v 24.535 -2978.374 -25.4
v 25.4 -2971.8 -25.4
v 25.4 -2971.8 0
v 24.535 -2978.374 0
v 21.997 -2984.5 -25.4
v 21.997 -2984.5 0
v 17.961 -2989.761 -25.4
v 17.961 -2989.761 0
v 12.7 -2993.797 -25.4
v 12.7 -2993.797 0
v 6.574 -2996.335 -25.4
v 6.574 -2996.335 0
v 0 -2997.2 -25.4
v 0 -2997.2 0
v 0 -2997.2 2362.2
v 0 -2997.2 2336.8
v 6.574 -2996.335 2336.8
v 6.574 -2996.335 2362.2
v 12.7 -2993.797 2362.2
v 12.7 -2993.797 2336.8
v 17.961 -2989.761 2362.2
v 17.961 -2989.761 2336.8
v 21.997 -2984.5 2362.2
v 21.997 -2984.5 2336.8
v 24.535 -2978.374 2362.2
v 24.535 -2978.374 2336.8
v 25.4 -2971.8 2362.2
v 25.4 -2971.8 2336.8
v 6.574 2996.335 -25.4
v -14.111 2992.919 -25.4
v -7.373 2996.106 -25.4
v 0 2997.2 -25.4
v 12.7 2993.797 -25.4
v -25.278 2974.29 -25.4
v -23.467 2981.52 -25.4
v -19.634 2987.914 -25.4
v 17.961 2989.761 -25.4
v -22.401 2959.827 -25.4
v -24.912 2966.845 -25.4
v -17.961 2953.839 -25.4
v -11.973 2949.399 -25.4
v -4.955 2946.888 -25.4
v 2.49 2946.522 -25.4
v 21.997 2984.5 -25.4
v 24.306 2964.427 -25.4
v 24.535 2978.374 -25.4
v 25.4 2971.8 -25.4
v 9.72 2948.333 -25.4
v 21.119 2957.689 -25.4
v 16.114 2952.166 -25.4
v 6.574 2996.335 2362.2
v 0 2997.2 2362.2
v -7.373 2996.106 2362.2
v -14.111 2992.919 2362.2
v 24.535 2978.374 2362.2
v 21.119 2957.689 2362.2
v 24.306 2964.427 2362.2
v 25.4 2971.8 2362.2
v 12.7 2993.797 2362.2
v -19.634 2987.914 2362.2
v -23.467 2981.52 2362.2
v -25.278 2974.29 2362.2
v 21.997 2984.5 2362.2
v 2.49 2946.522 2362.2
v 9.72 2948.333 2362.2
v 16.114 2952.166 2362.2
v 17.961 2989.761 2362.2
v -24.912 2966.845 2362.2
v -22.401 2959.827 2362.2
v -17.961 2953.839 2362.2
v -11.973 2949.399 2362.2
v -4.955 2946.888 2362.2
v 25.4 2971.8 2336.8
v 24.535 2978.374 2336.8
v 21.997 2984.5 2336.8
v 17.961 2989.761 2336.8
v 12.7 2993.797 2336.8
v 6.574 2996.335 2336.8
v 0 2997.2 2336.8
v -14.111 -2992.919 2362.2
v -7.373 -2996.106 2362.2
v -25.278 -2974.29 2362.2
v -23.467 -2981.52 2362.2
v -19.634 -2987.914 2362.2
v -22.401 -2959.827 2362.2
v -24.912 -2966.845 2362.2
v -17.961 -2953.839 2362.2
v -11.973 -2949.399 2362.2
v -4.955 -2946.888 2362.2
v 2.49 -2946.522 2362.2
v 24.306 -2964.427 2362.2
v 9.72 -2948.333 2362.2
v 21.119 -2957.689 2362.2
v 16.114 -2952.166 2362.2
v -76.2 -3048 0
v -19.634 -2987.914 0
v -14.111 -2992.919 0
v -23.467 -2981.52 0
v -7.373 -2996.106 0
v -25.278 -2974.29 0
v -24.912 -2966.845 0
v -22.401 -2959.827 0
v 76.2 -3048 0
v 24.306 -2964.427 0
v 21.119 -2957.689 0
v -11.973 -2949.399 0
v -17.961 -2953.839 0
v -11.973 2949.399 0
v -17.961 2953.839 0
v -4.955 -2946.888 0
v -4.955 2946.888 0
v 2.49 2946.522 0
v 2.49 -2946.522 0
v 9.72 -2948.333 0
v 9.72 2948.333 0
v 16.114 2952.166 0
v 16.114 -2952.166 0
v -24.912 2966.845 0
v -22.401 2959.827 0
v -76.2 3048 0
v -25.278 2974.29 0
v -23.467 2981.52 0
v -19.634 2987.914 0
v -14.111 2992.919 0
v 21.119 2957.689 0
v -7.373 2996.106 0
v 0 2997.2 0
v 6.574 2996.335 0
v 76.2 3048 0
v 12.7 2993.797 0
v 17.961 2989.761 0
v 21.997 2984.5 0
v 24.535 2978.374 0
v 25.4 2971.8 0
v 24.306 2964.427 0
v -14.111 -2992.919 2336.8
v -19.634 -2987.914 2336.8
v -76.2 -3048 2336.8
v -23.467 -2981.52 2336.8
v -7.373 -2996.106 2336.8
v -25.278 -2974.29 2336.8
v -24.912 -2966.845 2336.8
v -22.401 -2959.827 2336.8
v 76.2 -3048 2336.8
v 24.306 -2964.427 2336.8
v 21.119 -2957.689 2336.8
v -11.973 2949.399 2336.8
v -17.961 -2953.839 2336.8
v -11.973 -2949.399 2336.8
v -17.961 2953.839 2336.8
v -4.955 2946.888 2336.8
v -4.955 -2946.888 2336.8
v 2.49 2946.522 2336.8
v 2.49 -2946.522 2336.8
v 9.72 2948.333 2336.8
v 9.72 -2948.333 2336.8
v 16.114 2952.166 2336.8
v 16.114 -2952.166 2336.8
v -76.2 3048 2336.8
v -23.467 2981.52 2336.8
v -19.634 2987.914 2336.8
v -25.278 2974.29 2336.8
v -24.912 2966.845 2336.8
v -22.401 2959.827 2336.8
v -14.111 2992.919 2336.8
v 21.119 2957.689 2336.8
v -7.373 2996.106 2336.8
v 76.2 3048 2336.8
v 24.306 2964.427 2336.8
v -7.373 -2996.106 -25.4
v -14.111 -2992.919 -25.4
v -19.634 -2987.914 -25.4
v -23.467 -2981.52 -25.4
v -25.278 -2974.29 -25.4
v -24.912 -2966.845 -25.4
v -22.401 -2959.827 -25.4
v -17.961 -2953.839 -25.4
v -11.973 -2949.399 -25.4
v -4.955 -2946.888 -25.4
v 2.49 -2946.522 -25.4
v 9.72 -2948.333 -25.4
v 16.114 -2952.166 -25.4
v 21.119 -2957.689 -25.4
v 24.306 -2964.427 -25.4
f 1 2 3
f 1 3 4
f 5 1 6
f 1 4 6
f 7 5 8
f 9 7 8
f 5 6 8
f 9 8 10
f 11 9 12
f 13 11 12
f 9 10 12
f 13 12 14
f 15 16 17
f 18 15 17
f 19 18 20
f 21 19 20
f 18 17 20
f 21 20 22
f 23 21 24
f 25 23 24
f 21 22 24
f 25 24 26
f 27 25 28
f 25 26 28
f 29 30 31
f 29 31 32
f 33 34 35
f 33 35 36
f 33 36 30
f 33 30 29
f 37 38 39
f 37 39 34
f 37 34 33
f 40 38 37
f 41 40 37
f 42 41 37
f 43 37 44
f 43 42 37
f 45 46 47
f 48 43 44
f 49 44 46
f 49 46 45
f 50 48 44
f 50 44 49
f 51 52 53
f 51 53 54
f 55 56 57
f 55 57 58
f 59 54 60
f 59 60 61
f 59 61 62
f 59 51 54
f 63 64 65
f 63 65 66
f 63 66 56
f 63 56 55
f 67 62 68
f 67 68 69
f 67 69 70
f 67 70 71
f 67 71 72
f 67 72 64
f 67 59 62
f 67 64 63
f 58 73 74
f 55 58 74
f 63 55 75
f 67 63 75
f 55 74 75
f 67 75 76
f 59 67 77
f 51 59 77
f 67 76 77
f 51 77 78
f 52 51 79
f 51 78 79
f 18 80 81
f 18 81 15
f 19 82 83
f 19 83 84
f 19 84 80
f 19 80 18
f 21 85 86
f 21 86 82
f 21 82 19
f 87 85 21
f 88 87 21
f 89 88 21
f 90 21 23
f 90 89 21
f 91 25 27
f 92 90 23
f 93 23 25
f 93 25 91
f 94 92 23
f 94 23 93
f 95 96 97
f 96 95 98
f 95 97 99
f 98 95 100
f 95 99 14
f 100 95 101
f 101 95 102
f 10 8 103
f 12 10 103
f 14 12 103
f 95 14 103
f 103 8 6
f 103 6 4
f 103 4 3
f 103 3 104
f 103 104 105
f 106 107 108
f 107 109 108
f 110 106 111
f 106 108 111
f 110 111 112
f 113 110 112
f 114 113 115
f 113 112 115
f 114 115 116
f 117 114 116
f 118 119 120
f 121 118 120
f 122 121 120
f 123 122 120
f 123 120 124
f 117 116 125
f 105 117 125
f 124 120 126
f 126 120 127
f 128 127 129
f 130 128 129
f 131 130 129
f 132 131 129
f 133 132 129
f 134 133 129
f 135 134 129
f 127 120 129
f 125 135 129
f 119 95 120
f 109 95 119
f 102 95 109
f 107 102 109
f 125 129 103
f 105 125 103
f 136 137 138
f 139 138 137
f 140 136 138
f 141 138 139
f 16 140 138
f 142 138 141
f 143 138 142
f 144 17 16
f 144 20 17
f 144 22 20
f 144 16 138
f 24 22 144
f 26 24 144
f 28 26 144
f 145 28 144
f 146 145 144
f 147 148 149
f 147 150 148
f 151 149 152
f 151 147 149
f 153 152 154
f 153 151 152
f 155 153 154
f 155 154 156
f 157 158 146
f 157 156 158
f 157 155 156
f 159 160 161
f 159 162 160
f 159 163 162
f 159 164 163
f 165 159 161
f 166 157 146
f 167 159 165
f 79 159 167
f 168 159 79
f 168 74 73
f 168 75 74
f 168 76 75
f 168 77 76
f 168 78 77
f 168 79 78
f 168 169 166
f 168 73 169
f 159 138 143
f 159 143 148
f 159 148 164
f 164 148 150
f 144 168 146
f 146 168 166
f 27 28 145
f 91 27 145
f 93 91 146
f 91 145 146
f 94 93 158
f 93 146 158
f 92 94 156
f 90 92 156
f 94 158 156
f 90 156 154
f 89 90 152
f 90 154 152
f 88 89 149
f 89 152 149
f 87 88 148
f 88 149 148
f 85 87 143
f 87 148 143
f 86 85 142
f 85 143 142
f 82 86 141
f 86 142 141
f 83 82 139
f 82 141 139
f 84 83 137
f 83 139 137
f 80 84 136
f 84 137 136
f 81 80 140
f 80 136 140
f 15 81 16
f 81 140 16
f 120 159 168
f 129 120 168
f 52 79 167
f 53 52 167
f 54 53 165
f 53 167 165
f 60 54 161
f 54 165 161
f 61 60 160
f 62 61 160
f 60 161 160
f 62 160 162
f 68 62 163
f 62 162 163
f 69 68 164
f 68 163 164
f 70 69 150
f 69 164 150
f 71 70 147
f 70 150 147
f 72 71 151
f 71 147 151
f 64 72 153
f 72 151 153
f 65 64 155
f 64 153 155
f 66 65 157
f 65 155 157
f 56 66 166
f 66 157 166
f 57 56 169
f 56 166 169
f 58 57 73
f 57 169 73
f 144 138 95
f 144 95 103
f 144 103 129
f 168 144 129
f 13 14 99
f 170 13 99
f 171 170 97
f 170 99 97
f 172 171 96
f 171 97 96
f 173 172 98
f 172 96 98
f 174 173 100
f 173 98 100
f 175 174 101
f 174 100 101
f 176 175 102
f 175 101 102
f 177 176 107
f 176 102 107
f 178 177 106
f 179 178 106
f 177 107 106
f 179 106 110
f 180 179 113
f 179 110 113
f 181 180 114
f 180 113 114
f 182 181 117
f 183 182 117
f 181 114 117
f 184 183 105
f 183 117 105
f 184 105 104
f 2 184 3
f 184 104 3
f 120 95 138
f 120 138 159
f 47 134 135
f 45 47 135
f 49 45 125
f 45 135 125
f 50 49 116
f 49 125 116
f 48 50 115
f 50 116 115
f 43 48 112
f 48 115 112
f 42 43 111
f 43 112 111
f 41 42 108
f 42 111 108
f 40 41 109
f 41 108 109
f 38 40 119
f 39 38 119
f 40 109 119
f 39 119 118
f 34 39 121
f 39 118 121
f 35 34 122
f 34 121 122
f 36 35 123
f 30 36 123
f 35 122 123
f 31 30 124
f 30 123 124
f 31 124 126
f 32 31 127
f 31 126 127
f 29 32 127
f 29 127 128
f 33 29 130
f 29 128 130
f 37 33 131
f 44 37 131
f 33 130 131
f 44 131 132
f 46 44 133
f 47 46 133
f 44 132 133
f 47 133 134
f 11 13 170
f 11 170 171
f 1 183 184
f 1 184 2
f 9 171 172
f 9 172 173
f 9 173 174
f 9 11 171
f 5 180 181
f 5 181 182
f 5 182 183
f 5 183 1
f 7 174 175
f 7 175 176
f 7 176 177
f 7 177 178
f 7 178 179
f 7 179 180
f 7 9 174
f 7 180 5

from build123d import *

# Parameters (mm, degrees)
F0_W     = 152.4
F0_H     = 6096
F1_DEPTH = 2336.8
F3_DEPTH = 25.4
F5_DEPTH = 25.4


with BuildPart() as f1:
    # F0 (on Top) → F1 (new body)
    with BuildSketch(Plane.XY):
        Rectangle(F0_W, F0_H)
    extrude(amount=F1_DEPTH)

    # F2 (on face) → F3 (join)
    with BuildSketch(Plane(origin=(0, 0, 0), x_dir=(1, 0, 0), z_dir=(0, 0, -1))):
        with BuildLine():
            Line((0, 2971.8), (25.4, 2971.8))
            ThreePointArc((25.4, 2971.8), (17.960512, 2989.760512), (0, 2997.2))
            Line((0, 2997.2), (0, 2971.8))
        make_face()
        with BuildLine():
            ThreePointArc((0, 2997.2), (-17.960512, 2953.839488), (25.4, 2971.8))
            Line((25.4, 2971.8), (0, 2971.8))
            Line((0, 2971.8), (0, 2997.2))
        make_face()
        with BuildLine():
            ThreePointArc((25.4, -2971.8), (-17.960512, -2953.839488), (0, -2997.2))
            Line((0, -2997.2), (0, -2971.8))
            Line((0, -2971.8), (25.4, -2971.8))
        make_face()
        with BuildLine():
            Line((0, -2971.8), (0, -2997.2))
            ThreePointArc((0, -2997.2), (17.960512, -2989.760512), (25.4, -2971.8))
            Line((25.4, -2971.8), (0, -2971.8))
        make_face()
    extrude(amount=F3_DEPTH)

    # F4 (on face) → F5 (join)
    with BuildSketch(Plane.XY.offset(2336.8)):
        with BuildLine():
            ThreePointArc((25.4, 2971.8), (17.960512, 2989.760512), (0, 2997.2))
            Line((0, 2997.2), (0, 2971.8))
            Line((0, 2971.8), (25.4, 2971.8))
        make_face()
        with BuildLine():
            Line((0, 2971.8), (0, 2997.2))
            ThreePointArc((0, 2997.2), (-17.960512, 2953.839488), (25.4, 2971.8))
            Line((25.4, 2971.8), (0, 2971.8))
        make_face()
        with BuildLine():
            ThreePointArc((0, -2997.2), (17.960512, -2989.760512), (25.4, -2971.8))
            Line((25.4, -2971.8), (0, -2971.8))
            Line((0, -2971.8), (0, -2997.2))
        make_face()
        with BuildLine():
            Line((0, -2971.8), (25.4, -2971.8))
            ThreePointArc((25.4, -2971.8), (-17.960512, -2953.839488), (0, -2997.2))
            Line((0, -2997.2), (0, -2971.8))
        make_face()
    extrude(amount=F5_DEPTH)


solid = f1.part
